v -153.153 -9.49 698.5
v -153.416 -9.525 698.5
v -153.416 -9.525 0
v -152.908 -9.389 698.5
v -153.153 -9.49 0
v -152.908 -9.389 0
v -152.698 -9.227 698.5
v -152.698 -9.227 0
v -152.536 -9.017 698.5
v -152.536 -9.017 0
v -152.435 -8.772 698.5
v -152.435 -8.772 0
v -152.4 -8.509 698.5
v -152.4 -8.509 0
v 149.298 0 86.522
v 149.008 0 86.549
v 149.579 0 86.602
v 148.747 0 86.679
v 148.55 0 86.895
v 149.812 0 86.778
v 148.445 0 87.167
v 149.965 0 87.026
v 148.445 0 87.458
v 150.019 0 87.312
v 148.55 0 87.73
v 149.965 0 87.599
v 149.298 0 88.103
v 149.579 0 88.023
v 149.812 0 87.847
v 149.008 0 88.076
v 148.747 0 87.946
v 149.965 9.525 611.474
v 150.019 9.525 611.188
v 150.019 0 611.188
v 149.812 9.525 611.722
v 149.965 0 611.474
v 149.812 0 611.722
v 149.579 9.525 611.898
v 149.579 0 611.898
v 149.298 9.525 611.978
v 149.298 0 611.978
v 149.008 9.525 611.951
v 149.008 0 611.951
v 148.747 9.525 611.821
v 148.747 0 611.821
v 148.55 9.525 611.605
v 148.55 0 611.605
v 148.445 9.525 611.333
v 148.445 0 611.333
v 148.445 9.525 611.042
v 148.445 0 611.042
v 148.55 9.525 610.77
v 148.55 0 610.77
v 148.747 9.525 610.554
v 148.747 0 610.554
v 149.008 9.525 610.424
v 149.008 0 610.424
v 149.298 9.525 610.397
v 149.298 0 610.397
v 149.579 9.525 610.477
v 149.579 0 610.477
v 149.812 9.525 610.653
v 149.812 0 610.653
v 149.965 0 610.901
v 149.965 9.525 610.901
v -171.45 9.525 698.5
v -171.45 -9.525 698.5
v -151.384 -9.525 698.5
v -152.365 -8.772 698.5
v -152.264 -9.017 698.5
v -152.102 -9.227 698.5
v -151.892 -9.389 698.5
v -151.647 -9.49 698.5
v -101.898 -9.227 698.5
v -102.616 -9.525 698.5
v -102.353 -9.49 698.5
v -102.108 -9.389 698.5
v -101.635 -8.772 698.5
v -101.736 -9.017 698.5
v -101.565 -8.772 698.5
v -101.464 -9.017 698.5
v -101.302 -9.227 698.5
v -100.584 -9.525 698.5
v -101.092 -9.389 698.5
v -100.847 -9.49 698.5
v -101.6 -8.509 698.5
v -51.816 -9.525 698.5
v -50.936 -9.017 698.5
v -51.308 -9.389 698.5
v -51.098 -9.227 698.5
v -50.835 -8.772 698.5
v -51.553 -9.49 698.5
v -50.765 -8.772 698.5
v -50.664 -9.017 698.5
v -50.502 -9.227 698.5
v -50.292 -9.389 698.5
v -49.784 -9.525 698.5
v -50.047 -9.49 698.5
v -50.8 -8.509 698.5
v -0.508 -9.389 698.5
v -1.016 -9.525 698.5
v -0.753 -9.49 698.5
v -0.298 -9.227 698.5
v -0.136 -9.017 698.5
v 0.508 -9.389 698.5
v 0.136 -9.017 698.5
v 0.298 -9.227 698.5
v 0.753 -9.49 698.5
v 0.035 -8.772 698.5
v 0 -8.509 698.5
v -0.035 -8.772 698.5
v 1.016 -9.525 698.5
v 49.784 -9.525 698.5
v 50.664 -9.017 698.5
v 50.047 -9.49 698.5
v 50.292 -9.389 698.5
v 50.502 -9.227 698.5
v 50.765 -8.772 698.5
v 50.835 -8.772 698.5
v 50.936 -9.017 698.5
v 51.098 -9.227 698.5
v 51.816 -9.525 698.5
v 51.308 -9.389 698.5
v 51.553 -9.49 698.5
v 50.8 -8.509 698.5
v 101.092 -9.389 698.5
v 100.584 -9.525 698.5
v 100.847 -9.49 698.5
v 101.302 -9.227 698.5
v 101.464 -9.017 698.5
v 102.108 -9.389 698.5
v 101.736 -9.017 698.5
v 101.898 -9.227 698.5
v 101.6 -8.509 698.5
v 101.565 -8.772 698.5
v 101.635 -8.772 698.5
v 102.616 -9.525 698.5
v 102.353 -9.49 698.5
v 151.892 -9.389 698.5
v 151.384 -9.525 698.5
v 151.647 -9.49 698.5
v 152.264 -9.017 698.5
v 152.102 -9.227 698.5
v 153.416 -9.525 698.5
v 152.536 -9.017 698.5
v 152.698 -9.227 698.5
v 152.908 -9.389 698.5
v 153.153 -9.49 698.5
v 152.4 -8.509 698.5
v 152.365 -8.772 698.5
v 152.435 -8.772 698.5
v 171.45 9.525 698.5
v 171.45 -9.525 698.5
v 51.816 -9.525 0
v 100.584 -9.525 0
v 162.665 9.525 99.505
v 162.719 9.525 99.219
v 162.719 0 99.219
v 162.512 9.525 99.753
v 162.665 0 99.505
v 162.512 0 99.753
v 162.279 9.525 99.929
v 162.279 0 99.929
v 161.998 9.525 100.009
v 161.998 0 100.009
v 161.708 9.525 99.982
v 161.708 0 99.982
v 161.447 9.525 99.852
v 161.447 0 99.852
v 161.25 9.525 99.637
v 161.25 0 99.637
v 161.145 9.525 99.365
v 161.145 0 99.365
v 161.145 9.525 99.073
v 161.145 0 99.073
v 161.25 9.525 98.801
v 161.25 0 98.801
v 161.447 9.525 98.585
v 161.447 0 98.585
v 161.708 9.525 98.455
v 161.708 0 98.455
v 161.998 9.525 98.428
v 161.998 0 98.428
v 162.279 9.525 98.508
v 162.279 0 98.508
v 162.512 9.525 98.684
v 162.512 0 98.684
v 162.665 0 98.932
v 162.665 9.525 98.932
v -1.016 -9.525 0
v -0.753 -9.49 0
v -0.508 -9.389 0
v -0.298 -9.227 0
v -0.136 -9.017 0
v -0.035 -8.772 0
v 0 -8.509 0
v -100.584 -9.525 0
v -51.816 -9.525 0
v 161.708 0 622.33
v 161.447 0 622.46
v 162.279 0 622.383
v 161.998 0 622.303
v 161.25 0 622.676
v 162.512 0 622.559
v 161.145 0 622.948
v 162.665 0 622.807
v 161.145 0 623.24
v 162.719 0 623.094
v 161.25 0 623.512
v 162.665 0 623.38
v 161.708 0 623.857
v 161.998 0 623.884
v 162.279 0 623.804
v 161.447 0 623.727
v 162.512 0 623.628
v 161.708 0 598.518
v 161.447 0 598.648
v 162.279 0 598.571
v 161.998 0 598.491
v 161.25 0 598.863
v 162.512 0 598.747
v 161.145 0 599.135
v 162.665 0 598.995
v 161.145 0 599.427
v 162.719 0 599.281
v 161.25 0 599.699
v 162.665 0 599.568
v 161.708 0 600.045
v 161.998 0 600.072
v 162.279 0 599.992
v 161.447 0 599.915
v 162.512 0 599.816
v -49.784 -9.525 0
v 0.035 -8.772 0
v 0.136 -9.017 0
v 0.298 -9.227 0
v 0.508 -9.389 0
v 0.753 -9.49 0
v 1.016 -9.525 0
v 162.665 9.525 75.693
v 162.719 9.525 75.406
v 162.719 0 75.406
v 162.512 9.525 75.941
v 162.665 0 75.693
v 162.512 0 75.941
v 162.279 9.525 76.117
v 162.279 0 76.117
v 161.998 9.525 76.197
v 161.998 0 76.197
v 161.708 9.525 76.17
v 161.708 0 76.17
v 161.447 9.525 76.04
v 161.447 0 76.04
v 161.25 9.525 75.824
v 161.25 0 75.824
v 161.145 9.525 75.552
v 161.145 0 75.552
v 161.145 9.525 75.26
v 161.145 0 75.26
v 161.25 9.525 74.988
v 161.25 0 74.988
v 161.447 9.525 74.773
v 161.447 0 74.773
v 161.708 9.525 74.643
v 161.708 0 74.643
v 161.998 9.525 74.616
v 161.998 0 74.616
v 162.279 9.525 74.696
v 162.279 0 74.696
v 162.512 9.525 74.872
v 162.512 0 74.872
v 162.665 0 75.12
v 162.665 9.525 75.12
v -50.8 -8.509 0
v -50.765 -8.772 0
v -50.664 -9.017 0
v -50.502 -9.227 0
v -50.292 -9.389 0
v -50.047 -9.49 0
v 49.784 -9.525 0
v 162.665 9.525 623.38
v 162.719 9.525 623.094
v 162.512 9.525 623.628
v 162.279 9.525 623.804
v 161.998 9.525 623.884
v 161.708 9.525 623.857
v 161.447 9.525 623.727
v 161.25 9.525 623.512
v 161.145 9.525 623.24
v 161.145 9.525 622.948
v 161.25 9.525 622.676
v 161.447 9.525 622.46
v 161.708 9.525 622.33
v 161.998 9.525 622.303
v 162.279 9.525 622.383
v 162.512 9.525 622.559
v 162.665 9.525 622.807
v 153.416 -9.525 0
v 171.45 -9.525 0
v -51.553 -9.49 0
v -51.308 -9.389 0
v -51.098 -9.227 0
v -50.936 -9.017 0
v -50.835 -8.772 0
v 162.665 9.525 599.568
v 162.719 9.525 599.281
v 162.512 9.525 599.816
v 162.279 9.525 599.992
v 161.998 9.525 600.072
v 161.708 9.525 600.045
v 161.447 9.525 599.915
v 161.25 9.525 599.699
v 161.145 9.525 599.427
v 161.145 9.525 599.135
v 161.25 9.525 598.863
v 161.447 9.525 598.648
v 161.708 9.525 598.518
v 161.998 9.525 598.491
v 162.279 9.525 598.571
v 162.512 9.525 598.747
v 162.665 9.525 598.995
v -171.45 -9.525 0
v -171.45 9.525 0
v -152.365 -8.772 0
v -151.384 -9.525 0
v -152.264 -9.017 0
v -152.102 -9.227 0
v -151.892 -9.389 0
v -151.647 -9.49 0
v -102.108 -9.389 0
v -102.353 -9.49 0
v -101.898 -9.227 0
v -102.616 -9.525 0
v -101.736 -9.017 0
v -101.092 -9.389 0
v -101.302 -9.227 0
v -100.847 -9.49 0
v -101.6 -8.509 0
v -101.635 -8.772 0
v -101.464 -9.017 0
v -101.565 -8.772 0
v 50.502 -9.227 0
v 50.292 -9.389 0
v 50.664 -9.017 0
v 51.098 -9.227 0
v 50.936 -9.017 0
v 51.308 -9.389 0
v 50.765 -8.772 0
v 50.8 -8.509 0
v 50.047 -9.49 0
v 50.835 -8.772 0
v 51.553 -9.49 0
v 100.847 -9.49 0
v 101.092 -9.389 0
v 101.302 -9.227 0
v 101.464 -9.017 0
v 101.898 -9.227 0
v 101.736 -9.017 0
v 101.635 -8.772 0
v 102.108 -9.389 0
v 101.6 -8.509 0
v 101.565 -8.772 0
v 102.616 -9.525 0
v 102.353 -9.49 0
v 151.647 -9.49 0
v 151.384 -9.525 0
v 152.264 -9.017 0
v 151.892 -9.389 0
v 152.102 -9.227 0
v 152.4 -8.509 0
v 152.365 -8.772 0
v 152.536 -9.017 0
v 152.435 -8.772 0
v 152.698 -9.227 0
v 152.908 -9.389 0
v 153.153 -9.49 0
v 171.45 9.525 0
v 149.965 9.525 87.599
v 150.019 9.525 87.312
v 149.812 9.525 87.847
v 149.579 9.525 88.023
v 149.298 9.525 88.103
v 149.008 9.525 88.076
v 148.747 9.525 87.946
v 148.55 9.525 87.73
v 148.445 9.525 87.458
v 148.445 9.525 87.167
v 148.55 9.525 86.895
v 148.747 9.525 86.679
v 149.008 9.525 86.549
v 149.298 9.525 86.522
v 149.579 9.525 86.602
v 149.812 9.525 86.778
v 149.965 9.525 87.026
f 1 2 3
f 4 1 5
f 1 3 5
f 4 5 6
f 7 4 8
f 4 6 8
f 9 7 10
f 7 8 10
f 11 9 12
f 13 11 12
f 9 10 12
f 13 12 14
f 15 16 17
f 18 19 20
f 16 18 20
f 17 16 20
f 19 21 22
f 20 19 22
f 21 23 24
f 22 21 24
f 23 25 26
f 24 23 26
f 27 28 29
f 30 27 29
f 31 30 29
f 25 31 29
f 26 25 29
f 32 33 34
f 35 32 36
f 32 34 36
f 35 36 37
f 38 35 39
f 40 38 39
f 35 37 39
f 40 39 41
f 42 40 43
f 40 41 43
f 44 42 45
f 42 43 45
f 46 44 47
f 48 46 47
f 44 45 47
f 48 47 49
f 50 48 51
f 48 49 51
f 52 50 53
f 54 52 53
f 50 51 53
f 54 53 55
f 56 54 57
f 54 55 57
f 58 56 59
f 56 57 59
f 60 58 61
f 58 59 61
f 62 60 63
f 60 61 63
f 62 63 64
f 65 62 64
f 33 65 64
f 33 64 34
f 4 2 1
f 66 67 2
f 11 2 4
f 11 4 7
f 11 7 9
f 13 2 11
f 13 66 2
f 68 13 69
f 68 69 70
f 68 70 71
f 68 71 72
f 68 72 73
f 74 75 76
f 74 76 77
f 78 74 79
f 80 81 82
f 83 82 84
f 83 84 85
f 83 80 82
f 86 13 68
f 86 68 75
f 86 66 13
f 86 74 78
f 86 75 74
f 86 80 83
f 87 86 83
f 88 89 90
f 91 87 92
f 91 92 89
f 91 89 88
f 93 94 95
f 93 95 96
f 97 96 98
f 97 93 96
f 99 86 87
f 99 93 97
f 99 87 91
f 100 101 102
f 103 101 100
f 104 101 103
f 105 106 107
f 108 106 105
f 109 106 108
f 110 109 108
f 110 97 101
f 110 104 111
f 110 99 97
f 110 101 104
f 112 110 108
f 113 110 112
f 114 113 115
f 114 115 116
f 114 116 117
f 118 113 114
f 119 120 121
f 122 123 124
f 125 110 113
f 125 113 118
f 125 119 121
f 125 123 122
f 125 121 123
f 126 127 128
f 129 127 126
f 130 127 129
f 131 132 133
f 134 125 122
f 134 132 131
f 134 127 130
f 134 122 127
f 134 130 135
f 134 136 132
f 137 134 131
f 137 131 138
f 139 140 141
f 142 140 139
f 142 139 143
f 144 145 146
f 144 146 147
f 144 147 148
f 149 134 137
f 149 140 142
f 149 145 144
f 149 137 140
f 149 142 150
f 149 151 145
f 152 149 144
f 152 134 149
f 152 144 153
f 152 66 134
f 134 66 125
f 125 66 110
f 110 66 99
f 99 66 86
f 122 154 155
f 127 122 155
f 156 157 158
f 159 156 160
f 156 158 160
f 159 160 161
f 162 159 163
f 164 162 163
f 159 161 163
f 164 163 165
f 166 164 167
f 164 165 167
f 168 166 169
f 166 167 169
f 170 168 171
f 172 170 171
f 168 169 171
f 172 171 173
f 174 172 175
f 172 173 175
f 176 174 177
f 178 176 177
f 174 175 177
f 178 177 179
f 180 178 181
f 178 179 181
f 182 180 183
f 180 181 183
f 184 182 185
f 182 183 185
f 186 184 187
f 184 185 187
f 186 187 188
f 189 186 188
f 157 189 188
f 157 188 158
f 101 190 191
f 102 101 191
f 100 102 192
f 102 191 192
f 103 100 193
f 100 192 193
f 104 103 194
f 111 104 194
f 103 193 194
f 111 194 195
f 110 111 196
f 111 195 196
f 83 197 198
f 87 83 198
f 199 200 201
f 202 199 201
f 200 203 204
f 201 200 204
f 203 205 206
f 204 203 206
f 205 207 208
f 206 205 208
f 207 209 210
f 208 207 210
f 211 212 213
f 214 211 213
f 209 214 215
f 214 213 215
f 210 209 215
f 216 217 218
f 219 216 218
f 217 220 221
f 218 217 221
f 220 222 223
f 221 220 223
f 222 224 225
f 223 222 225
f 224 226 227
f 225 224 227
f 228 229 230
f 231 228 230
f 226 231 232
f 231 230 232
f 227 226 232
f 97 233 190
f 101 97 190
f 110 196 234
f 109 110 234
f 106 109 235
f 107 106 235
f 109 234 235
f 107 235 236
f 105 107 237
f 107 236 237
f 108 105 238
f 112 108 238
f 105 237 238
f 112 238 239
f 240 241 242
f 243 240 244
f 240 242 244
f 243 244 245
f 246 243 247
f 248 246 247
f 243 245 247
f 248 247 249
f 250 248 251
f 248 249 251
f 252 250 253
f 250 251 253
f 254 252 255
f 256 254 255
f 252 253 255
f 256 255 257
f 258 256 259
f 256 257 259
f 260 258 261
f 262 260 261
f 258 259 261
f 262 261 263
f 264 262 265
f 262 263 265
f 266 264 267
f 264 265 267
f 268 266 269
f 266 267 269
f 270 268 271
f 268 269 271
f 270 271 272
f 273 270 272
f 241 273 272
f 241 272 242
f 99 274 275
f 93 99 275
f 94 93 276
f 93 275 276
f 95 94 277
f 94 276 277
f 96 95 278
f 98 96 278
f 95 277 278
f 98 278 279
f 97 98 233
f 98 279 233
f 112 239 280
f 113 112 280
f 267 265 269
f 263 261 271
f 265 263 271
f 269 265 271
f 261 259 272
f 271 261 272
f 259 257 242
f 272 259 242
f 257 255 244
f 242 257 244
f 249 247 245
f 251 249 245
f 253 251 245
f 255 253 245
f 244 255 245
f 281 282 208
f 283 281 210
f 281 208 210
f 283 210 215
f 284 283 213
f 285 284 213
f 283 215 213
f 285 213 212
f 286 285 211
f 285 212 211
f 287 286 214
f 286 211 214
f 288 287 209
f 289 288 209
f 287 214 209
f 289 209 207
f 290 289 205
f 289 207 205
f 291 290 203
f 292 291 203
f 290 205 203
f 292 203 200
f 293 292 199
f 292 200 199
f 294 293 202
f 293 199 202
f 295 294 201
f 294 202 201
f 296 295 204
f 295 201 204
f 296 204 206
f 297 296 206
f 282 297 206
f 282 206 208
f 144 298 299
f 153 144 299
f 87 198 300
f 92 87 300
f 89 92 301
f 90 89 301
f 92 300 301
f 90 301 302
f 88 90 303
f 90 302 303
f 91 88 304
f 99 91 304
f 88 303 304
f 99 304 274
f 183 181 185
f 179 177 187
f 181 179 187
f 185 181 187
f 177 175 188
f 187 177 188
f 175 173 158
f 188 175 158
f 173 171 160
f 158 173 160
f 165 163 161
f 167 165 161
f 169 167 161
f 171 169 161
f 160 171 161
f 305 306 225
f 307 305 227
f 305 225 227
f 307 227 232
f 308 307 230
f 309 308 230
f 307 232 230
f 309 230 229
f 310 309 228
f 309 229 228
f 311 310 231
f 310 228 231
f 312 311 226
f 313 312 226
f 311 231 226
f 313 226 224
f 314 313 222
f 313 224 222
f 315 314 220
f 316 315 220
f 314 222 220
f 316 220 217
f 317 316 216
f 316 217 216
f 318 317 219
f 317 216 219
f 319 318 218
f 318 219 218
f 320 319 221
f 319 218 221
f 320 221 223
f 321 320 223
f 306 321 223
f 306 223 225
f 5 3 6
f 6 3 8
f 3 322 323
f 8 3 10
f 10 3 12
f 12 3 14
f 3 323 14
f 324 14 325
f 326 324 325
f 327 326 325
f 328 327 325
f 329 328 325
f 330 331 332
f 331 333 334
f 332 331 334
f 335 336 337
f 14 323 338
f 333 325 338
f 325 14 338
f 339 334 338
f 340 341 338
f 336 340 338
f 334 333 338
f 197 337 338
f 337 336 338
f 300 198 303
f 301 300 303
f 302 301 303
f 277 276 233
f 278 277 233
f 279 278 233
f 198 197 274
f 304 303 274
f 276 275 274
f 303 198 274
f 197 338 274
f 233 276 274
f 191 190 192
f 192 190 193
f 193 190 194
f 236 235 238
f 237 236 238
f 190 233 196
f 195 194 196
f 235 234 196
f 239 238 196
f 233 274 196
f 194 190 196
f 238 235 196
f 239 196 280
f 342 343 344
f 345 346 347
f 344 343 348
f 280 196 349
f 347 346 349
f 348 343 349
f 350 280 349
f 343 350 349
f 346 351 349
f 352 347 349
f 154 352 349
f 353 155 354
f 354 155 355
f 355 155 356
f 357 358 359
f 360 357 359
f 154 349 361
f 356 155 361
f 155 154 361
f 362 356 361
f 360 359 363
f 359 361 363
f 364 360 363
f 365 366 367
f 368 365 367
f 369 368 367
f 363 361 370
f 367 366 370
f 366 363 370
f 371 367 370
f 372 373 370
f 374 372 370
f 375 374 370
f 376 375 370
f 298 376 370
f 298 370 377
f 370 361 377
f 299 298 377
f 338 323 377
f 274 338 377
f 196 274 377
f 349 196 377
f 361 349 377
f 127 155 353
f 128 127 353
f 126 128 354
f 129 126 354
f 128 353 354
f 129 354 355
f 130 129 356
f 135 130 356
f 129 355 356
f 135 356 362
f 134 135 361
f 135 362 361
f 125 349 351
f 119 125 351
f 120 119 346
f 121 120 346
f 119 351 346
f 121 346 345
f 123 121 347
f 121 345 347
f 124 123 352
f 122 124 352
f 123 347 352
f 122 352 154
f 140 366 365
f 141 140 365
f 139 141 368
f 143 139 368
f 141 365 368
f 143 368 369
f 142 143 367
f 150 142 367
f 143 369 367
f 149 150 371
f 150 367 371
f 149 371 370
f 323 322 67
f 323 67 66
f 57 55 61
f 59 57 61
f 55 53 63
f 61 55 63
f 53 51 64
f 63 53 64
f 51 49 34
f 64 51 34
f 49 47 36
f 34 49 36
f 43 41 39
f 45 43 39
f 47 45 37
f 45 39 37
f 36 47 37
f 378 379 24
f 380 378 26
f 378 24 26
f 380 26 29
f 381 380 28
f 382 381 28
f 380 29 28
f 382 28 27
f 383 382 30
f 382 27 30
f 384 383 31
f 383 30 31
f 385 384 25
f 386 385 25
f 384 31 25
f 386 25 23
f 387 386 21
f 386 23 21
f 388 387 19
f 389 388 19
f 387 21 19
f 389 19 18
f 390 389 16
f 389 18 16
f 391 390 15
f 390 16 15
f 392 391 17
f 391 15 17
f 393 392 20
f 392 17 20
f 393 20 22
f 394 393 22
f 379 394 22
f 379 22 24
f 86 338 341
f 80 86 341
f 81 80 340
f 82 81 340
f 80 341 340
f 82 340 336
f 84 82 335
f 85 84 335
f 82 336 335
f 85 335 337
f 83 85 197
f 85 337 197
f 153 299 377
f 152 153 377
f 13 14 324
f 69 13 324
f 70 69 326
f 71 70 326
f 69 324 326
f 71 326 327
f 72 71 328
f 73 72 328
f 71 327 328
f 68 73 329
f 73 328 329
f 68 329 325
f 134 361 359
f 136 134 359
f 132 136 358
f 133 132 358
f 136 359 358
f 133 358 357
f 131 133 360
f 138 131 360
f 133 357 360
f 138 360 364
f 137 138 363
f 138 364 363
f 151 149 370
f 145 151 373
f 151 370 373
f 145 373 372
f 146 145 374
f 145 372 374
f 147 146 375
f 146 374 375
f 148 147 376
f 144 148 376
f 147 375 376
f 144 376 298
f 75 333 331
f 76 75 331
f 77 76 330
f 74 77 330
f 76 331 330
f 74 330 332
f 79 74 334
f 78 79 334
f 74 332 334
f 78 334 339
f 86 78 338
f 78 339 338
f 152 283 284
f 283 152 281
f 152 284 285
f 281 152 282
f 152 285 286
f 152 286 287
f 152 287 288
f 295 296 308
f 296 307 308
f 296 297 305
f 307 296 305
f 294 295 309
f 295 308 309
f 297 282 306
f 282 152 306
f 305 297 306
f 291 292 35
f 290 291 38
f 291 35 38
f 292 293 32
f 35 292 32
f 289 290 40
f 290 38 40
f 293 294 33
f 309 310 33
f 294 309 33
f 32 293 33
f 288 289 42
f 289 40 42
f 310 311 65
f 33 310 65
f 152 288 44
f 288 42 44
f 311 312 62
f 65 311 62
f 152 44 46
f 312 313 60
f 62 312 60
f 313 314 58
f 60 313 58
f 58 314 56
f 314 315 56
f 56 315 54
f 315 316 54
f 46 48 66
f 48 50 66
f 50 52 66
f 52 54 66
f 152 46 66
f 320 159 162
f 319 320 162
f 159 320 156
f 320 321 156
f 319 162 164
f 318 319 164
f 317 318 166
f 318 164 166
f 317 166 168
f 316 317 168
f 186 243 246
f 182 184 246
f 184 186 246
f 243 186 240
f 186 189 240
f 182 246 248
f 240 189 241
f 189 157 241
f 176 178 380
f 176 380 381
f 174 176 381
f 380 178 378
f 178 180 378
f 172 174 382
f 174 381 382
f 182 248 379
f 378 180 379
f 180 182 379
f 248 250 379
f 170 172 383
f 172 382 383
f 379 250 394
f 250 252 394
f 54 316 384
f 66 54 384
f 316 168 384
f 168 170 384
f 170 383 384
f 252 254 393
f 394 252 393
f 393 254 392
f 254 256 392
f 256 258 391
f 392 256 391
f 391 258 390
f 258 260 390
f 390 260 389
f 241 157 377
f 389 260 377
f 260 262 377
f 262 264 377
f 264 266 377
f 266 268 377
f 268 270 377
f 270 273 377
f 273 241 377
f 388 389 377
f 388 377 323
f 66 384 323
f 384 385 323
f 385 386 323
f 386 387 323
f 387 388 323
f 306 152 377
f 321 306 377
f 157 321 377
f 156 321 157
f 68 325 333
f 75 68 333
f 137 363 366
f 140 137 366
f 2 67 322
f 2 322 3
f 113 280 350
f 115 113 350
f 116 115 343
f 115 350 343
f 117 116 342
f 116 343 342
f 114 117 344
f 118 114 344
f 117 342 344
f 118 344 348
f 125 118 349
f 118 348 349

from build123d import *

# Parameters (mm, degrees)
F1_DEPTH = 698.5
F2_W     = 508
F2_H     = 137.227848
F2_H_2   = 195.285798
F3_DEPTH = 1143
F4_R     = 0.79375
F5_DEPTH = 25.4


with BuildPart() as f1:
    # F0 (on Top) → F1 (new body)
    with BuildSketch(Plane.XY):
        with BuildLine():
            Line((458.216, -9.525), (508, -9.525))
            Line((508, -9.525), (508, 9.525))
            Line((508, 9.525), (-508, 9.525))
            Line((-508, 9.525), (-508, -8.509))
            ThreePointArc((-508, -8.509), (-507.70242, -9.22742), (-506.984, -9.525))
            Line((-506.984, -9.525), (-458.216, -9.525))
            ThreePointArc((-458.216, -9.525), (-457.49758, -9.22742), (-457.2, -8.509))
            ThreePointArc((-457.2, -8.509), (-456.90242, -9.22742), (-456.184, -9.525))
            Line((-456.184, -9.525), (-407.416, -9.525))
            ThreePointArc((-407.416, -9.525), (-406.69758, -9.22742), (-406.4, -8.509))
            ThreePointArc((-406.4, -8.509), (-406.10242, -9.22742), (-405.384, -9.525))
            Line((-405.384, -9.525), (-356.616, -9.525))
            ThreePointArc((-356.616, -9.525), (-355.89758, -9.22742), (-355.6, -8.509))
            ThreePointArc((-355.6, -8.509), (-355.30242, -9.22742), (-354.584, -9.525))
            Line((-354.584, -9.525), (-305.816, -9.525))
            ThreePointArc((-305.816, -9.525), (-305.09758, -9.22742), (-304.8, -8.509))
            ThreePointArc((-304.8, -8.509), (-304.50242, -9.22742), (-303.784, -9.525))
            Line((-303.784, -9.525), (-255.016, -9.525))
            ThreePointArc((-255.016, -9.525), (-254.29758, -9.22742), (-254, -8.509))
            ThreePointArc((-254, -8.509), (-253.70242, -9.22742), (-252.984, -9.525))
            Line((-252.984, -9.525), (-204.216, -9.525))
            ThreePointArc((-204.216, -9.525), (-203.49758, -9.22742), (-203.2, -8.509))
            ThreePointArc((-203.2, -8.509), (-202.90242, -9.22742), (-202.184, -9.525))
            Line((-202.184, -9.525), (-153.416, -9.525))
            ThreePointArc((-153.416, -9.525), (-152.69758, -9.22742), (-152.4, -8.509))
            ThreePointArc((-152.4, -8.509), (-152.10242, -9.22742), (-151.384, -9.525))
            Line((-151.384, -9.525), (-102.616, -9.525))
            ThreePointArc((-102.616, -9.525), (-101.89758, -9.22742), (-101.6, -8.509))
            ThreePointArc((-101.6, -8.509), (-101.30242, -9.22742), (-100.584, -9.525))
            Line((-100.584, -9.525), (-51.816, -9.525))
            ThreePointArc((-51.816, -9.525), (-51.09758, -9.22742), (-50.8, -8.509))
            ThreePointArc((-50.8, -8.509), (-50.50242, -9.22742), (-49.784, -9.525))
            Line((-49.784, -9.525), (-1.016, -9.525))
            ThreePointArc((-1.016, -9.525), (-0.29758, -9.22742), (0, -8.509))
            ThreePointArc((0, -8.509), (0.29758, -9.22742), (1.016, -9.525))
            Line((1.016, -9.525), (49.784, -9.525))
            ThreePointArc((49.784, -9.525), (50.50242, -9.22742), (50.8, -8.509))
            ThreePointArc((50.8, -8.509), (51.09758, -9.22742), (51.816, -9.525))
            Line((51.816, -9.525), (100.584, -9.525))
            ThreePointArc((100.584, -9.525), (101.30242, -9.22742), (101.6, -8.509))
            ThreePointArc((101.6, -8.509), (101.89758, -9.22742), (102.616, -9.525))
            Line((102.616, -9.525), (151.384, -9.525))
            ThreePointArc((151.384, -9.525), (152.10242, -9.22742), (152.4, -8.509))
            ThreePointArc((152.4, -8.509), (152.69758, -9.22742), (153.416, -9.525))
            Line((153.416, -9.525), (202.184, -9.525))
            ThreePointArc((202.184, -9.525), (202.90242, -9.22742), (203.2, -8.509))
            ThreePointArc((203.2, -8.509), (203.49758, -9.22742), (204.216, -9.525))
            Line((204.216, -9.525), (252.984, -9.525))
            ThreePointArc((252.984, -9.525), (253.70242, -9.22742), (254, -8.509))
            ThreePointArc((254, -8.509), (254.29758, -9.22742), (255.016, -9.525))
            Line((255.016, -9.525), (303.784, -9.525))
            ThreePointArc((303.784, -9.525), (304.50242, -9.22742), (304.8, -8.509))
            ThreePointArc((304.8, -8.509), (305.09758, -9.22742), (305.816, -9.525))
            Line((305.816, -9.525), (354.584, -9.525))
            ThreePointArc((354.584, -9.525), (355.30242, -9.22742), (355.6, -8.509))
            ThreePointArc((355.6, -8.509), (355.89758, -9.22742), (356.616, -9.525))
            Line((356.616, -9.525), (405.384, -9.525))
            ThreePointArc((405.384, -9.525), (406.10242, -9.22742), (406.4, -8.509))
            ThreePointArc((406.4, -8.509), (406.69758, -9.22742), (407.416, -9.525))
            Line((407.416, -9.525), (456.184, -9.525))
            ThreePointArc((456.184, -9.525), (456.90242, -9.22742), (457.2, -8.509))
            ThreePointArc((457.2, -8.509), (457.49758, -9.22742), (458.216, -9.525))
        make_face()
        with BuildLine():
            ThreePointArc((-506.984, -9.525), (-507.70242, -9.22742), (-508, -8.509))
            Line((-508, -8.509), (-508, -9.525))
            Line((-508, -9.525), (-506.984, -9.525))
        make_face()
    extrude(amount=F1_DEPTH)

    # F2 (on Top) → F3 (cut)
    with BuildSketch(Plane.XY):
        with Locations((425.45, -20.971623)):
            Rectangle(F2_W, F2_H)
        with Locations((-425.45, -39.444607)):
            Rectangle(F2_W, F2_H_2)
    extrude(amount=F3_DEPTH, mode=Mode.SUBTRACT)

    # F4 (on Front) → F5 (cut)
    with BuildSketch(Plane.XZ):
        with Locations((161.925, 623.09375)):
            Circle(F4_R)
        with Locations((149.225, 611.1875)):
            Circle(F4_R)
        with Locations((161.925, 599.28125)):
            Circle(F4_R)
        with Locations((161.925, 99.21875)):
            Circle(F4_R)
        with Locations((149.225, 87.3125)):
            Circle(F4_R)
        with Locations((161.925, 75.40625)):
            Circle(F4_R)
    extrude(amount=-F5_DEPTH, mode=Mode.SUBTRACT)


solid = f1.part
